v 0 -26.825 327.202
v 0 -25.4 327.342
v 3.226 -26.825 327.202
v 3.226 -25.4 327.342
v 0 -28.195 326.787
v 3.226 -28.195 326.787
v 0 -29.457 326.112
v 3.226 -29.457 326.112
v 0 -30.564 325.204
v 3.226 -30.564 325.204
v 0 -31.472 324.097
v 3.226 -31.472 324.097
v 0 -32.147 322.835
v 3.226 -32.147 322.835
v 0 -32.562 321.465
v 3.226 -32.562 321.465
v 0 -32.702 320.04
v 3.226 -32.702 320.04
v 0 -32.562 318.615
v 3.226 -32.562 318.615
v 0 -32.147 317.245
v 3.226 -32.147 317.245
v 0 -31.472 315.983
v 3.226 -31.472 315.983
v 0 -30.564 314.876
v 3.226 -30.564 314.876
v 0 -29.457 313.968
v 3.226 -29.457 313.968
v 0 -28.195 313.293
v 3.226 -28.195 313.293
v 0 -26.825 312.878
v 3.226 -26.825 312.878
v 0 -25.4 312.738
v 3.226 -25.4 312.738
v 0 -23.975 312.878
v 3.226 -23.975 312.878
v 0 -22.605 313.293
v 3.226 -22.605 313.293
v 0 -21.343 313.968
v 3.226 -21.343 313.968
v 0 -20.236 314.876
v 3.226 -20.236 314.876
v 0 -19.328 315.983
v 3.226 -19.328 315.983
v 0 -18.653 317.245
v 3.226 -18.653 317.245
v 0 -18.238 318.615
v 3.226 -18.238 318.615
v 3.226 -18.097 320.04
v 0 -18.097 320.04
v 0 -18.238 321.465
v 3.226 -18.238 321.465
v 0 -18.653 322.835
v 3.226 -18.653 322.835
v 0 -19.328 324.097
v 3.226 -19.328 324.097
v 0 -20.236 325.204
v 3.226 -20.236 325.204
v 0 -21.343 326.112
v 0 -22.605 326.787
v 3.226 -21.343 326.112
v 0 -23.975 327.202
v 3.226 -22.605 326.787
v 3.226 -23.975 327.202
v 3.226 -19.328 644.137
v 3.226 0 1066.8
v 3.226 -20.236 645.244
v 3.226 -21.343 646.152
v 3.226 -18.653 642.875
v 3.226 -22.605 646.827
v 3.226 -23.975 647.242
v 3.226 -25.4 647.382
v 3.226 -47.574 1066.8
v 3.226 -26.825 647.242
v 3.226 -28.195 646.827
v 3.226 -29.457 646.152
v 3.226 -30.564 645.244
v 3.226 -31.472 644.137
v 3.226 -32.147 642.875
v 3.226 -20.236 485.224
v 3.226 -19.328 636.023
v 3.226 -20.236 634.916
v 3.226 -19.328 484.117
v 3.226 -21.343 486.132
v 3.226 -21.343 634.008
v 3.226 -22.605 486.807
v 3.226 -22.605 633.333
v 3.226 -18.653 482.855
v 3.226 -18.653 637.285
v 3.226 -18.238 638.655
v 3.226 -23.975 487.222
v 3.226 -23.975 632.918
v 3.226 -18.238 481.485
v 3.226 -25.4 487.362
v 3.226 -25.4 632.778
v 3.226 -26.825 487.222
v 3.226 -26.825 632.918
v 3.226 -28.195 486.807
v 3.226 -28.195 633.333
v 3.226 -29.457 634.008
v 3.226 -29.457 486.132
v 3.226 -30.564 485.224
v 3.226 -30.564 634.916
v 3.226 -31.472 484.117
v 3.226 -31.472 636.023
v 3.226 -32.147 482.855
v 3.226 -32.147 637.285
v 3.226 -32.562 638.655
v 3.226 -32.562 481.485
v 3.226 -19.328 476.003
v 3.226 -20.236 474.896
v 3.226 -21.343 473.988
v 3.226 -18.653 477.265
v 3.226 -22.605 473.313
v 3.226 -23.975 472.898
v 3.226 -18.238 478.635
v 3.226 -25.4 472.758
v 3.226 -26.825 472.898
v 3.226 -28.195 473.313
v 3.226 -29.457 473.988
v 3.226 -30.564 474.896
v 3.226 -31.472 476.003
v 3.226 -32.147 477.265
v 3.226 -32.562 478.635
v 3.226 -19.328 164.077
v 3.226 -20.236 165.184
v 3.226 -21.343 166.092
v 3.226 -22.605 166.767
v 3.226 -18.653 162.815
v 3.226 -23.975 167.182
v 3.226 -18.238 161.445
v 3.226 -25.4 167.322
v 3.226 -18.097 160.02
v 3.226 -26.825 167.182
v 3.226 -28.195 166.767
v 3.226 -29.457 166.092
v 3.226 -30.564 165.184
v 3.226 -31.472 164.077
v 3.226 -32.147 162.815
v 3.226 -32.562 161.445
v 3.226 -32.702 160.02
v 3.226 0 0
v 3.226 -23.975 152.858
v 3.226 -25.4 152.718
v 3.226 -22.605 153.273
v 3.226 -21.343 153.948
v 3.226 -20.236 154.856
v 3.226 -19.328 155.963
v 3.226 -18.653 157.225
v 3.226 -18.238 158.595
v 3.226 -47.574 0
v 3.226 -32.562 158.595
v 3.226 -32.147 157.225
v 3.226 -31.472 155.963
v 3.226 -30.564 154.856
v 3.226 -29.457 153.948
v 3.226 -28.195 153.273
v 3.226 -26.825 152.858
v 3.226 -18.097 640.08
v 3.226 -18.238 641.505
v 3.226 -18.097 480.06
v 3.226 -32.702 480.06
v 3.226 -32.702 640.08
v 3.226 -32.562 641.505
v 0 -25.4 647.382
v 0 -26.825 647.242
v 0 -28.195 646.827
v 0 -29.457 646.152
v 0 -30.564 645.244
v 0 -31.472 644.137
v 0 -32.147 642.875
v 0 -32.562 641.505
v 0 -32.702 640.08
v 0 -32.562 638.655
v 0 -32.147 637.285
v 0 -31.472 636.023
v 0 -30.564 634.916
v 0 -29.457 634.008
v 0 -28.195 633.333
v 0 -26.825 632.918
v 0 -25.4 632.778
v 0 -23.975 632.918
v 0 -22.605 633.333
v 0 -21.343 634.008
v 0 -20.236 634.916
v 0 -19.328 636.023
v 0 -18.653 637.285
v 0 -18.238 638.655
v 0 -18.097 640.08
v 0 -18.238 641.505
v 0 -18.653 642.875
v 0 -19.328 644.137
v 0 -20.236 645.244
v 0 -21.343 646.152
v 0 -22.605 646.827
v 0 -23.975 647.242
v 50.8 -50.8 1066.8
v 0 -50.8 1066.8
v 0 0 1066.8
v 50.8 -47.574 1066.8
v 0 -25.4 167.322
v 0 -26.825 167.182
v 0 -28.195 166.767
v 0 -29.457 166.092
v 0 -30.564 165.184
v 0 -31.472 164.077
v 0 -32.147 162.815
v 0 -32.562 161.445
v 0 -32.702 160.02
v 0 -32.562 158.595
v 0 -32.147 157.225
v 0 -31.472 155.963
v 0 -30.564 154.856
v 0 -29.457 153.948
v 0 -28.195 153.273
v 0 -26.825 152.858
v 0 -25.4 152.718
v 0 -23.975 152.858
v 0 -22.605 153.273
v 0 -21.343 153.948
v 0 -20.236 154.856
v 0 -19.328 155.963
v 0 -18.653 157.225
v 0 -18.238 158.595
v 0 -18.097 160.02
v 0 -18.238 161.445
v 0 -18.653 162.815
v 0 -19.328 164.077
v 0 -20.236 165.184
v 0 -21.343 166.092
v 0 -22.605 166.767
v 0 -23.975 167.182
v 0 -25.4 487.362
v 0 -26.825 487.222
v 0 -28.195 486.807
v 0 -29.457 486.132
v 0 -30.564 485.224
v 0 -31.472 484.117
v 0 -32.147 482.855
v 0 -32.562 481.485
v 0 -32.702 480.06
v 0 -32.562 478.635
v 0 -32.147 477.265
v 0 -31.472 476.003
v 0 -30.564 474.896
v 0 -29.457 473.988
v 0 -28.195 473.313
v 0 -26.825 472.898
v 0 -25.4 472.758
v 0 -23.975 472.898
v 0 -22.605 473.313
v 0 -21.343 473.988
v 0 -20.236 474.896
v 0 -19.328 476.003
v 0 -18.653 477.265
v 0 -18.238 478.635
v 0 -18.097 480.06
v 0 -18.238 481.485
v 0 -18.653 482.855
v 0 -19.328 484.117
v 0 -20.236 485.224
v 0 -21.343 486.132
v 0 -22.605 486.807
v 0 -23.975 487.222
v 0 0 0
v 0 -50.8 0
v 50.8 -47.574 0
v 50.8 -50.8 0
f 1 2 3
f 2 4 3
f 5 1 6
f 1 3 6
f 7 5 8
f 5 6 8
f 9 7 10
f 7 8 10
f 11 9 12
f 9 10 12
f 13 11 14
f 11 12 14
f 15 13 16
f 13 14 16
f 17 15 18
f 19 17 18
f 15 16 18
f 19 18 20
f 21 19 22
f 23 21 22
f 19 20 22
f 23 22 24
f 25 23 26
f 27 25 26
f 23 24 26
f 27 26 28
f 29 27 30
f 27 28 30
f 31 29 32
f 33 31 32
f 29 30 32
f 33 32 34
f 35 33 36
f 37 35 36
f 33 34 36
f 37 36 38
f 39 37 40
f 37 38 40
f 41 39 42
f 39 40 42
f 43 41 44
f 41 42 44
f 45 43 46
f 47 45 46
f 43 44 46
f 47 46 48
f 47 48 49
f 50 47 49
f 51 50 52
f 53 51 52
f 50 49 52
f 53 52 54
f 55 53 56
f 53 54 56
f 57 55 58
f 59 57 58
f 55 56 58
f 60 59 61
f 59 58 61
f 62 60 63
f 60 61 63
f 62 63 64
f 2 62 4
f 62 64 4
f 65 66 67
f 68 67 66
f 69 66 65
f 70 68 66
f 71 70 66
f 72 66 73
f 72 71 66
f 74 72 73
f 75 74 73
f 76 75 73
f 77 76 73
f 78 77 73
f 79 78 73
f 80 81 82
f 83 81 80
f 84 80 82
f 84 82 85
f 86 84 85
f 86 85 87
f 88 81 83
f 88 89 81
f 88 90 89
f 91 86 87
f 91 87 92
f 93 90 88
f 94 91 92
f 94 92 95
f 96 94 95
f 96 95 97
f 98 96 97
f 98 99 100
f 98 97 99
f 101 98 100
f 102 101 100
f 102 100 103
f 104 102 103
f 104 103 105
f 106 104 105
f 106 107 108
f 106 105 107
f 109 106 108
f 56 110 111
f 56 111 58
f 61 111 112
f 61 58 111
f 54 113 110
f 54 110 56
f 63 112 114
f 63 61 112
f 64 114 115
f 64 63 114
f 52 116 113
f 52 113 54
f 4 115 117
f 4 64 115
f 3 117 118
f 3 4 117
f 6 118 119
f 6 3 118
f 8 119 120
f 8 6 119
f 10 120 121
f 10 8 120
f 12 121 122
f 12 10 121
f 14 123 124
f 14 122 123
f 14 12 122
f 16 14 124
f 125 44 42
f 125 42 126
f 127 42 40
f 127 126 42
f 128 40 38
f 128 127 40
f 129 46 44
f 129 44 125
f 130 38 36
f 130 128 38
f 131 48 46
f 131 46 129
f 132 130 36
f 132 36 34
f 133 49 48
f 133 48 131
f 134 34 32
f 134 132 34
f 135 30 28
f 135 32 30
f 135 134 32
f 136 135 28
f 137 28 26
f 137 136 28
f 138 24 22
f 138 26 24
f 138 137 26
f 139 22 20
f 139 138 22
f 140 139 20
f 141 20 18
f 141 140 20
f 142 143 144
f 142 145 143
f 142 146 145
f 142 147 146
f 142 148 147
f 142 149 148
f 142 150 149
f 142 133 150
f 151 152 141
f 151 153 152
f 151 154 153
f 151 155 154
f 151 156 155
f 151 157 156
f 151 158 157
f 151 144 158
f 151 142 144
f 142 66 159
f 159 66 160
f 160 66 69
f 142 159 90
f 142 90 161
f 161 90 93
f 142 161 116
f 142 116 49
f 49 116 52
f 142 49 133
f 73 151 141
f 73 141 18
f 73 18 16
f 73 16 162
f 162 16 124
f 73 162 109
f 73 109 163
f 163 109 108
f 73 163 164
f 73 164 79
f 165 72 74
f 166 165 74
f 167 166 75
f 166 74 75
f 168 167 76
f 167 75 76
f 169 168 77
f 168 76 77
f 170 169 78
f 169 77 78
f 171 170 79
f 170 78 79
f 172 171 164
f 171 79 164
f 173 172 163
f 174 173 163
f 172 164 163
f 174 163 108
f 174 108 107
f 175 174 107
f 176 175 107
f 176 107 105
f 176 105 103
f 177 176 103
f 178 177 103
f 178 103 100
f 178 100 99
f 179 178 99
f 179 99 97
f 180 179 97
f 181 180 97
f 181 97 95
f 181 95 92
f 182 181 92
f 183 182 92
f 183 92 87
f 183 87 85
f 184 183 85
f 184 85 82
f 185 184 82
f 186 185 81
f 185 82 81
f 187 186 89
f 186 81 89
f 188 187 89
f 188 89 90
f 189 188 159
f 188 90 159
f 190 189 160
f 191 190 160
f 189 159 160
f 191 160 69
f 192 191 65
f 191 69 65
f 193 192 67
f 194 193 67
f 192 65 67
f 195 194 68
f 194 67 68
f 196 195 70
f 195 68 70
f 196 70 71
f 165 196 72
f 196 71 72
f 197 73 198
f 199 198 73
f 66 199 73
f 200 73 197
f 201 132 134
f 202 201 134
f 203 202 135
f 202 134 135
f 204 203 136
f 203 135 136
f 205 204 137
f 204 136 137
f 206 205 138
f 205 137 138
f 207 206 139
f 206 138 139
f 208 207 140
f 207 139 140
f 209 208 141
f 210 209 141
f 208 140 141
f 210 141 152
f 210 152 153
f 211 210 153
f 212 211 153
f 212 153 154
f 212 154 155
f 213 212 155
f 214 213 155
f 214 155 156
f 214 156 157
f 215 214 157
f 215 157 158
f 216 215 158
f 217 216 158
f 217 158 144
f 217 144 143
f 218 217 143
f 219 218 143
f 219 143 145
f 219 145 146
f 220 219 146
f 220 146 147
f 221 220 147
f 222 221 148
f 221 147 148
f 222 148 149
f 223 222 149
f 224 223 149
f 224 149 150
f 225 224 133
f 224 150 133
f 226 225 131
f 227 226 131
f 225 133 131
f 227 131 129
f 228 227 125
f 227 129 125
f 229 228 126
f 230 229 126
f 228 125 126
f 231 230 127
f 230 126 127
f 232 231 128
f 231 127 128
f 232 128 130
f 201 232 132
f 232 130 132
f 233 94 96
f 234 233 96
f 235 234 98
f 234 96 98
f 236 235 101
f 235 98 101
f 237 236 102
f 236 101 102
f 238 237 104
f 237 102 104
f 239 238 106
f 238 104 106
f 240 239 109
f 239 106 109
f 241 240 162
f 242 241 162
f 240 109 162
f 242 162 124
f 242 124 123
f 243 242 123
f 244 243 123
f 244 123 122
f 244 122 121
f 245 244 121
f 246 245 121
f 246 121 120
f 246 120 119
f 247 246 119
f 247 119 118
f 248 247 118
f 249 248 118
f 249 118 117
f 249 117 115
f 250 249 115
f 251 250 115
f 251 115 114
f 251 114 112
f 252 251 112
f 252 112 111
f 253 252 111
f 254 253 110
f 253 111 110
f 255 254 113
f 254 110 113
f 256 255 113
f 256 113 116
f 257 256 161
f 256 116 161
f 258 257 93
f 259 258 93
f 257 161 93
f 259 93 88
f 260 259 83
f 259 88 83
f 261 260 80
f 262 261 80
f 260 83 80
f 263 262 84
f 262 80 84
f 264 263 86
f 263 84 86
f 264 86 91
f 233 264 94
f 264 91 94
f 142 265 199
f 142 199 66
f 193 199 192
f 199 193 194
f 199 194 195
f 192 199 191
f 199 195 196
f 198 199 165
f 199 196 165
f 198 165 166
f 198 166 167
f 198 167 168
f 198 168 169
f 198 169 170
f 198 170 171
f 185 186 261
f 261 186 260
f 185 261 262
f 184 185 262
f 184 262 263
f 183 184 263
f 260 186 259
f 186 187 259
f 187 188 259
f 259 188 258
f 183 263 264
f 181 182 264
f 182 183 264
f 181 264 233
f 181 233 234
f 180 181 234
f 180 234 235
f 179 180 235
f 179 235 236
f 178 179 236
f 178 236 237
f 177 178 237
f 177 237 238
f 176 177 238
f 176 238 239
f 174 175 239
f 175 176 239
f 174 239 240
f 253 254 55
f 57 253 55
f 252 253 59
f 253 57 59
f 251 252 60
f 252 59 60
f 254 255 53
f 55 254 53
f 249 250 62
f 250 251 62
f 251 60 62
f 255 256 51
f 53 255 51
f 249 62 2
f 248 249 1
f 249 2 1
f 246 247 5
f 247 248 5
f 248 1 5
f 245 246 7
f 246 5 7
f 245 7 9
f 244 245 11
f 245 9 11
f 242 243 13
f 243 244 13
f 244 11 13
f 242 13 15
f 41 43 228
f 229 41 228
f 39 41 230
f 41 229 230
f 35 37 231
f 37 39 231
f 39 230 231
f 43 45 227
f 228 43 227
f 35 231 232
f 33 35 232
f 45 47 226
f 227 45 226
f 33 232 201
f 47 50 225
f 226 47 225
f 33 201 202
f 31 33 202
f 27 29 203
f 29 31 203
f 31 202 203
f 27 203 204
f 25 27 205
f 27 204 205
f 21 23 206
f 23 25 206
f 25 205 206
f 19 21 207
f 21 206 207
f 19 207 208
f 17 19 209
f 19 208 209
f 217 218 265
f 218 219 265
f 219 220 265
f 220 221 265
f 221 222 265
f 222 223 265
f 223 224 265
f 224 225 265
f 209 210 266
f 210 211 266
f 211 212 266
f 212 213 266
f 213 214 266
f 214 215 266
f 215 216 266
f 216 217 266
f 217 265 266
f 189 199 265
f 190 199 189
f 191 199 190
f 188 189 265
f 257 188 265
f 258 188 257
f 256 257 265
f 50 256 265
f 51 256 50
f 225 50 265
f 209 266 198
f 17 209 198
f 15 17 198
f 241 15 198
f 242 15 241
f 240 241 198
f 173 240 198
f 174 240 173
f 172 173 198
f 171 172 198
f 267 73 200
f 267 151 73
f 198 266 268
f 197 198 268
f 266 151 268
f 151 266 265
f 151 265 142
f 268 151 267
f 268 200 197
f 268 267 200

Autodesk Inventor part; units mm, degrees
ref_plane "YZ Plane" through (0, 0, 0) normal (1, 0, 0) x (0, 1, 0)
ref_plane "XZ Plane" through (0, 0, 0) normal (0, 1, 0) x (-1, 0, 0)
ref_plane "XY Plane" through (0, 0, 0) normal (0, 0, 1) x (1, 0, 0)
sketch "Sketch1" plane through (0, 0, 0) normal (0, 0, 1) x (1, 0, 0)
  line L0 (0, 0) -> (0, -50.8)
  line L1 (0, -50.8) -> (50.8, -50.8)
  line L2 (3.2258, 0) -> (3.2258, -47.5742)
  line L3 (3.2258, -47.5742) -> (50.8, -47.5742)
  line L4 (0, 0) -> (3.2258, 0)
  line L5 (50.8, -47.5742) -> (50.8, -50.8)
  dimension "d0" = 50.8
  dimension "d1" = 50.8
  dimension "d2" = 3.2258
extrude "Extrusion1" add sketch "Sketch1" along normal blind 1066.8
sketch "Sketch2" plane through (0, -50.8, 0) normal (-1, 0, 0) x (0, 0, 1)
  line L0 (1066.8, 50.8) -> (1066.8, 0) projected
  line L1 (0, 50.8) -> (0, 0) projected
  point P0 (160.02, 25.4)
  point P1 (320.04, 25.4)
  point P2 (480.06, 25.4)
  point P3 (640.08, 25.4)
  dimension "d5" = 1066.8
hole "Hole1" at (0, -25.4, 480.06) at (0, -25.4, 640.08) at (0, -25.4, 320.04) at (0, -25.4, 160.02) direction (1, 0, 0) diameter 14.605 end through all
sketch "Sketch3" plane through (0, -50.8, 0) normal (-1, 0, 0) x (0, 0, 1)
  point P0 (0, 50.8)
  point P1 (797.56, 25.4)
  point P2 (957.58, 25.4)
properties part number "angle al 1.5x1.5 (48)"
